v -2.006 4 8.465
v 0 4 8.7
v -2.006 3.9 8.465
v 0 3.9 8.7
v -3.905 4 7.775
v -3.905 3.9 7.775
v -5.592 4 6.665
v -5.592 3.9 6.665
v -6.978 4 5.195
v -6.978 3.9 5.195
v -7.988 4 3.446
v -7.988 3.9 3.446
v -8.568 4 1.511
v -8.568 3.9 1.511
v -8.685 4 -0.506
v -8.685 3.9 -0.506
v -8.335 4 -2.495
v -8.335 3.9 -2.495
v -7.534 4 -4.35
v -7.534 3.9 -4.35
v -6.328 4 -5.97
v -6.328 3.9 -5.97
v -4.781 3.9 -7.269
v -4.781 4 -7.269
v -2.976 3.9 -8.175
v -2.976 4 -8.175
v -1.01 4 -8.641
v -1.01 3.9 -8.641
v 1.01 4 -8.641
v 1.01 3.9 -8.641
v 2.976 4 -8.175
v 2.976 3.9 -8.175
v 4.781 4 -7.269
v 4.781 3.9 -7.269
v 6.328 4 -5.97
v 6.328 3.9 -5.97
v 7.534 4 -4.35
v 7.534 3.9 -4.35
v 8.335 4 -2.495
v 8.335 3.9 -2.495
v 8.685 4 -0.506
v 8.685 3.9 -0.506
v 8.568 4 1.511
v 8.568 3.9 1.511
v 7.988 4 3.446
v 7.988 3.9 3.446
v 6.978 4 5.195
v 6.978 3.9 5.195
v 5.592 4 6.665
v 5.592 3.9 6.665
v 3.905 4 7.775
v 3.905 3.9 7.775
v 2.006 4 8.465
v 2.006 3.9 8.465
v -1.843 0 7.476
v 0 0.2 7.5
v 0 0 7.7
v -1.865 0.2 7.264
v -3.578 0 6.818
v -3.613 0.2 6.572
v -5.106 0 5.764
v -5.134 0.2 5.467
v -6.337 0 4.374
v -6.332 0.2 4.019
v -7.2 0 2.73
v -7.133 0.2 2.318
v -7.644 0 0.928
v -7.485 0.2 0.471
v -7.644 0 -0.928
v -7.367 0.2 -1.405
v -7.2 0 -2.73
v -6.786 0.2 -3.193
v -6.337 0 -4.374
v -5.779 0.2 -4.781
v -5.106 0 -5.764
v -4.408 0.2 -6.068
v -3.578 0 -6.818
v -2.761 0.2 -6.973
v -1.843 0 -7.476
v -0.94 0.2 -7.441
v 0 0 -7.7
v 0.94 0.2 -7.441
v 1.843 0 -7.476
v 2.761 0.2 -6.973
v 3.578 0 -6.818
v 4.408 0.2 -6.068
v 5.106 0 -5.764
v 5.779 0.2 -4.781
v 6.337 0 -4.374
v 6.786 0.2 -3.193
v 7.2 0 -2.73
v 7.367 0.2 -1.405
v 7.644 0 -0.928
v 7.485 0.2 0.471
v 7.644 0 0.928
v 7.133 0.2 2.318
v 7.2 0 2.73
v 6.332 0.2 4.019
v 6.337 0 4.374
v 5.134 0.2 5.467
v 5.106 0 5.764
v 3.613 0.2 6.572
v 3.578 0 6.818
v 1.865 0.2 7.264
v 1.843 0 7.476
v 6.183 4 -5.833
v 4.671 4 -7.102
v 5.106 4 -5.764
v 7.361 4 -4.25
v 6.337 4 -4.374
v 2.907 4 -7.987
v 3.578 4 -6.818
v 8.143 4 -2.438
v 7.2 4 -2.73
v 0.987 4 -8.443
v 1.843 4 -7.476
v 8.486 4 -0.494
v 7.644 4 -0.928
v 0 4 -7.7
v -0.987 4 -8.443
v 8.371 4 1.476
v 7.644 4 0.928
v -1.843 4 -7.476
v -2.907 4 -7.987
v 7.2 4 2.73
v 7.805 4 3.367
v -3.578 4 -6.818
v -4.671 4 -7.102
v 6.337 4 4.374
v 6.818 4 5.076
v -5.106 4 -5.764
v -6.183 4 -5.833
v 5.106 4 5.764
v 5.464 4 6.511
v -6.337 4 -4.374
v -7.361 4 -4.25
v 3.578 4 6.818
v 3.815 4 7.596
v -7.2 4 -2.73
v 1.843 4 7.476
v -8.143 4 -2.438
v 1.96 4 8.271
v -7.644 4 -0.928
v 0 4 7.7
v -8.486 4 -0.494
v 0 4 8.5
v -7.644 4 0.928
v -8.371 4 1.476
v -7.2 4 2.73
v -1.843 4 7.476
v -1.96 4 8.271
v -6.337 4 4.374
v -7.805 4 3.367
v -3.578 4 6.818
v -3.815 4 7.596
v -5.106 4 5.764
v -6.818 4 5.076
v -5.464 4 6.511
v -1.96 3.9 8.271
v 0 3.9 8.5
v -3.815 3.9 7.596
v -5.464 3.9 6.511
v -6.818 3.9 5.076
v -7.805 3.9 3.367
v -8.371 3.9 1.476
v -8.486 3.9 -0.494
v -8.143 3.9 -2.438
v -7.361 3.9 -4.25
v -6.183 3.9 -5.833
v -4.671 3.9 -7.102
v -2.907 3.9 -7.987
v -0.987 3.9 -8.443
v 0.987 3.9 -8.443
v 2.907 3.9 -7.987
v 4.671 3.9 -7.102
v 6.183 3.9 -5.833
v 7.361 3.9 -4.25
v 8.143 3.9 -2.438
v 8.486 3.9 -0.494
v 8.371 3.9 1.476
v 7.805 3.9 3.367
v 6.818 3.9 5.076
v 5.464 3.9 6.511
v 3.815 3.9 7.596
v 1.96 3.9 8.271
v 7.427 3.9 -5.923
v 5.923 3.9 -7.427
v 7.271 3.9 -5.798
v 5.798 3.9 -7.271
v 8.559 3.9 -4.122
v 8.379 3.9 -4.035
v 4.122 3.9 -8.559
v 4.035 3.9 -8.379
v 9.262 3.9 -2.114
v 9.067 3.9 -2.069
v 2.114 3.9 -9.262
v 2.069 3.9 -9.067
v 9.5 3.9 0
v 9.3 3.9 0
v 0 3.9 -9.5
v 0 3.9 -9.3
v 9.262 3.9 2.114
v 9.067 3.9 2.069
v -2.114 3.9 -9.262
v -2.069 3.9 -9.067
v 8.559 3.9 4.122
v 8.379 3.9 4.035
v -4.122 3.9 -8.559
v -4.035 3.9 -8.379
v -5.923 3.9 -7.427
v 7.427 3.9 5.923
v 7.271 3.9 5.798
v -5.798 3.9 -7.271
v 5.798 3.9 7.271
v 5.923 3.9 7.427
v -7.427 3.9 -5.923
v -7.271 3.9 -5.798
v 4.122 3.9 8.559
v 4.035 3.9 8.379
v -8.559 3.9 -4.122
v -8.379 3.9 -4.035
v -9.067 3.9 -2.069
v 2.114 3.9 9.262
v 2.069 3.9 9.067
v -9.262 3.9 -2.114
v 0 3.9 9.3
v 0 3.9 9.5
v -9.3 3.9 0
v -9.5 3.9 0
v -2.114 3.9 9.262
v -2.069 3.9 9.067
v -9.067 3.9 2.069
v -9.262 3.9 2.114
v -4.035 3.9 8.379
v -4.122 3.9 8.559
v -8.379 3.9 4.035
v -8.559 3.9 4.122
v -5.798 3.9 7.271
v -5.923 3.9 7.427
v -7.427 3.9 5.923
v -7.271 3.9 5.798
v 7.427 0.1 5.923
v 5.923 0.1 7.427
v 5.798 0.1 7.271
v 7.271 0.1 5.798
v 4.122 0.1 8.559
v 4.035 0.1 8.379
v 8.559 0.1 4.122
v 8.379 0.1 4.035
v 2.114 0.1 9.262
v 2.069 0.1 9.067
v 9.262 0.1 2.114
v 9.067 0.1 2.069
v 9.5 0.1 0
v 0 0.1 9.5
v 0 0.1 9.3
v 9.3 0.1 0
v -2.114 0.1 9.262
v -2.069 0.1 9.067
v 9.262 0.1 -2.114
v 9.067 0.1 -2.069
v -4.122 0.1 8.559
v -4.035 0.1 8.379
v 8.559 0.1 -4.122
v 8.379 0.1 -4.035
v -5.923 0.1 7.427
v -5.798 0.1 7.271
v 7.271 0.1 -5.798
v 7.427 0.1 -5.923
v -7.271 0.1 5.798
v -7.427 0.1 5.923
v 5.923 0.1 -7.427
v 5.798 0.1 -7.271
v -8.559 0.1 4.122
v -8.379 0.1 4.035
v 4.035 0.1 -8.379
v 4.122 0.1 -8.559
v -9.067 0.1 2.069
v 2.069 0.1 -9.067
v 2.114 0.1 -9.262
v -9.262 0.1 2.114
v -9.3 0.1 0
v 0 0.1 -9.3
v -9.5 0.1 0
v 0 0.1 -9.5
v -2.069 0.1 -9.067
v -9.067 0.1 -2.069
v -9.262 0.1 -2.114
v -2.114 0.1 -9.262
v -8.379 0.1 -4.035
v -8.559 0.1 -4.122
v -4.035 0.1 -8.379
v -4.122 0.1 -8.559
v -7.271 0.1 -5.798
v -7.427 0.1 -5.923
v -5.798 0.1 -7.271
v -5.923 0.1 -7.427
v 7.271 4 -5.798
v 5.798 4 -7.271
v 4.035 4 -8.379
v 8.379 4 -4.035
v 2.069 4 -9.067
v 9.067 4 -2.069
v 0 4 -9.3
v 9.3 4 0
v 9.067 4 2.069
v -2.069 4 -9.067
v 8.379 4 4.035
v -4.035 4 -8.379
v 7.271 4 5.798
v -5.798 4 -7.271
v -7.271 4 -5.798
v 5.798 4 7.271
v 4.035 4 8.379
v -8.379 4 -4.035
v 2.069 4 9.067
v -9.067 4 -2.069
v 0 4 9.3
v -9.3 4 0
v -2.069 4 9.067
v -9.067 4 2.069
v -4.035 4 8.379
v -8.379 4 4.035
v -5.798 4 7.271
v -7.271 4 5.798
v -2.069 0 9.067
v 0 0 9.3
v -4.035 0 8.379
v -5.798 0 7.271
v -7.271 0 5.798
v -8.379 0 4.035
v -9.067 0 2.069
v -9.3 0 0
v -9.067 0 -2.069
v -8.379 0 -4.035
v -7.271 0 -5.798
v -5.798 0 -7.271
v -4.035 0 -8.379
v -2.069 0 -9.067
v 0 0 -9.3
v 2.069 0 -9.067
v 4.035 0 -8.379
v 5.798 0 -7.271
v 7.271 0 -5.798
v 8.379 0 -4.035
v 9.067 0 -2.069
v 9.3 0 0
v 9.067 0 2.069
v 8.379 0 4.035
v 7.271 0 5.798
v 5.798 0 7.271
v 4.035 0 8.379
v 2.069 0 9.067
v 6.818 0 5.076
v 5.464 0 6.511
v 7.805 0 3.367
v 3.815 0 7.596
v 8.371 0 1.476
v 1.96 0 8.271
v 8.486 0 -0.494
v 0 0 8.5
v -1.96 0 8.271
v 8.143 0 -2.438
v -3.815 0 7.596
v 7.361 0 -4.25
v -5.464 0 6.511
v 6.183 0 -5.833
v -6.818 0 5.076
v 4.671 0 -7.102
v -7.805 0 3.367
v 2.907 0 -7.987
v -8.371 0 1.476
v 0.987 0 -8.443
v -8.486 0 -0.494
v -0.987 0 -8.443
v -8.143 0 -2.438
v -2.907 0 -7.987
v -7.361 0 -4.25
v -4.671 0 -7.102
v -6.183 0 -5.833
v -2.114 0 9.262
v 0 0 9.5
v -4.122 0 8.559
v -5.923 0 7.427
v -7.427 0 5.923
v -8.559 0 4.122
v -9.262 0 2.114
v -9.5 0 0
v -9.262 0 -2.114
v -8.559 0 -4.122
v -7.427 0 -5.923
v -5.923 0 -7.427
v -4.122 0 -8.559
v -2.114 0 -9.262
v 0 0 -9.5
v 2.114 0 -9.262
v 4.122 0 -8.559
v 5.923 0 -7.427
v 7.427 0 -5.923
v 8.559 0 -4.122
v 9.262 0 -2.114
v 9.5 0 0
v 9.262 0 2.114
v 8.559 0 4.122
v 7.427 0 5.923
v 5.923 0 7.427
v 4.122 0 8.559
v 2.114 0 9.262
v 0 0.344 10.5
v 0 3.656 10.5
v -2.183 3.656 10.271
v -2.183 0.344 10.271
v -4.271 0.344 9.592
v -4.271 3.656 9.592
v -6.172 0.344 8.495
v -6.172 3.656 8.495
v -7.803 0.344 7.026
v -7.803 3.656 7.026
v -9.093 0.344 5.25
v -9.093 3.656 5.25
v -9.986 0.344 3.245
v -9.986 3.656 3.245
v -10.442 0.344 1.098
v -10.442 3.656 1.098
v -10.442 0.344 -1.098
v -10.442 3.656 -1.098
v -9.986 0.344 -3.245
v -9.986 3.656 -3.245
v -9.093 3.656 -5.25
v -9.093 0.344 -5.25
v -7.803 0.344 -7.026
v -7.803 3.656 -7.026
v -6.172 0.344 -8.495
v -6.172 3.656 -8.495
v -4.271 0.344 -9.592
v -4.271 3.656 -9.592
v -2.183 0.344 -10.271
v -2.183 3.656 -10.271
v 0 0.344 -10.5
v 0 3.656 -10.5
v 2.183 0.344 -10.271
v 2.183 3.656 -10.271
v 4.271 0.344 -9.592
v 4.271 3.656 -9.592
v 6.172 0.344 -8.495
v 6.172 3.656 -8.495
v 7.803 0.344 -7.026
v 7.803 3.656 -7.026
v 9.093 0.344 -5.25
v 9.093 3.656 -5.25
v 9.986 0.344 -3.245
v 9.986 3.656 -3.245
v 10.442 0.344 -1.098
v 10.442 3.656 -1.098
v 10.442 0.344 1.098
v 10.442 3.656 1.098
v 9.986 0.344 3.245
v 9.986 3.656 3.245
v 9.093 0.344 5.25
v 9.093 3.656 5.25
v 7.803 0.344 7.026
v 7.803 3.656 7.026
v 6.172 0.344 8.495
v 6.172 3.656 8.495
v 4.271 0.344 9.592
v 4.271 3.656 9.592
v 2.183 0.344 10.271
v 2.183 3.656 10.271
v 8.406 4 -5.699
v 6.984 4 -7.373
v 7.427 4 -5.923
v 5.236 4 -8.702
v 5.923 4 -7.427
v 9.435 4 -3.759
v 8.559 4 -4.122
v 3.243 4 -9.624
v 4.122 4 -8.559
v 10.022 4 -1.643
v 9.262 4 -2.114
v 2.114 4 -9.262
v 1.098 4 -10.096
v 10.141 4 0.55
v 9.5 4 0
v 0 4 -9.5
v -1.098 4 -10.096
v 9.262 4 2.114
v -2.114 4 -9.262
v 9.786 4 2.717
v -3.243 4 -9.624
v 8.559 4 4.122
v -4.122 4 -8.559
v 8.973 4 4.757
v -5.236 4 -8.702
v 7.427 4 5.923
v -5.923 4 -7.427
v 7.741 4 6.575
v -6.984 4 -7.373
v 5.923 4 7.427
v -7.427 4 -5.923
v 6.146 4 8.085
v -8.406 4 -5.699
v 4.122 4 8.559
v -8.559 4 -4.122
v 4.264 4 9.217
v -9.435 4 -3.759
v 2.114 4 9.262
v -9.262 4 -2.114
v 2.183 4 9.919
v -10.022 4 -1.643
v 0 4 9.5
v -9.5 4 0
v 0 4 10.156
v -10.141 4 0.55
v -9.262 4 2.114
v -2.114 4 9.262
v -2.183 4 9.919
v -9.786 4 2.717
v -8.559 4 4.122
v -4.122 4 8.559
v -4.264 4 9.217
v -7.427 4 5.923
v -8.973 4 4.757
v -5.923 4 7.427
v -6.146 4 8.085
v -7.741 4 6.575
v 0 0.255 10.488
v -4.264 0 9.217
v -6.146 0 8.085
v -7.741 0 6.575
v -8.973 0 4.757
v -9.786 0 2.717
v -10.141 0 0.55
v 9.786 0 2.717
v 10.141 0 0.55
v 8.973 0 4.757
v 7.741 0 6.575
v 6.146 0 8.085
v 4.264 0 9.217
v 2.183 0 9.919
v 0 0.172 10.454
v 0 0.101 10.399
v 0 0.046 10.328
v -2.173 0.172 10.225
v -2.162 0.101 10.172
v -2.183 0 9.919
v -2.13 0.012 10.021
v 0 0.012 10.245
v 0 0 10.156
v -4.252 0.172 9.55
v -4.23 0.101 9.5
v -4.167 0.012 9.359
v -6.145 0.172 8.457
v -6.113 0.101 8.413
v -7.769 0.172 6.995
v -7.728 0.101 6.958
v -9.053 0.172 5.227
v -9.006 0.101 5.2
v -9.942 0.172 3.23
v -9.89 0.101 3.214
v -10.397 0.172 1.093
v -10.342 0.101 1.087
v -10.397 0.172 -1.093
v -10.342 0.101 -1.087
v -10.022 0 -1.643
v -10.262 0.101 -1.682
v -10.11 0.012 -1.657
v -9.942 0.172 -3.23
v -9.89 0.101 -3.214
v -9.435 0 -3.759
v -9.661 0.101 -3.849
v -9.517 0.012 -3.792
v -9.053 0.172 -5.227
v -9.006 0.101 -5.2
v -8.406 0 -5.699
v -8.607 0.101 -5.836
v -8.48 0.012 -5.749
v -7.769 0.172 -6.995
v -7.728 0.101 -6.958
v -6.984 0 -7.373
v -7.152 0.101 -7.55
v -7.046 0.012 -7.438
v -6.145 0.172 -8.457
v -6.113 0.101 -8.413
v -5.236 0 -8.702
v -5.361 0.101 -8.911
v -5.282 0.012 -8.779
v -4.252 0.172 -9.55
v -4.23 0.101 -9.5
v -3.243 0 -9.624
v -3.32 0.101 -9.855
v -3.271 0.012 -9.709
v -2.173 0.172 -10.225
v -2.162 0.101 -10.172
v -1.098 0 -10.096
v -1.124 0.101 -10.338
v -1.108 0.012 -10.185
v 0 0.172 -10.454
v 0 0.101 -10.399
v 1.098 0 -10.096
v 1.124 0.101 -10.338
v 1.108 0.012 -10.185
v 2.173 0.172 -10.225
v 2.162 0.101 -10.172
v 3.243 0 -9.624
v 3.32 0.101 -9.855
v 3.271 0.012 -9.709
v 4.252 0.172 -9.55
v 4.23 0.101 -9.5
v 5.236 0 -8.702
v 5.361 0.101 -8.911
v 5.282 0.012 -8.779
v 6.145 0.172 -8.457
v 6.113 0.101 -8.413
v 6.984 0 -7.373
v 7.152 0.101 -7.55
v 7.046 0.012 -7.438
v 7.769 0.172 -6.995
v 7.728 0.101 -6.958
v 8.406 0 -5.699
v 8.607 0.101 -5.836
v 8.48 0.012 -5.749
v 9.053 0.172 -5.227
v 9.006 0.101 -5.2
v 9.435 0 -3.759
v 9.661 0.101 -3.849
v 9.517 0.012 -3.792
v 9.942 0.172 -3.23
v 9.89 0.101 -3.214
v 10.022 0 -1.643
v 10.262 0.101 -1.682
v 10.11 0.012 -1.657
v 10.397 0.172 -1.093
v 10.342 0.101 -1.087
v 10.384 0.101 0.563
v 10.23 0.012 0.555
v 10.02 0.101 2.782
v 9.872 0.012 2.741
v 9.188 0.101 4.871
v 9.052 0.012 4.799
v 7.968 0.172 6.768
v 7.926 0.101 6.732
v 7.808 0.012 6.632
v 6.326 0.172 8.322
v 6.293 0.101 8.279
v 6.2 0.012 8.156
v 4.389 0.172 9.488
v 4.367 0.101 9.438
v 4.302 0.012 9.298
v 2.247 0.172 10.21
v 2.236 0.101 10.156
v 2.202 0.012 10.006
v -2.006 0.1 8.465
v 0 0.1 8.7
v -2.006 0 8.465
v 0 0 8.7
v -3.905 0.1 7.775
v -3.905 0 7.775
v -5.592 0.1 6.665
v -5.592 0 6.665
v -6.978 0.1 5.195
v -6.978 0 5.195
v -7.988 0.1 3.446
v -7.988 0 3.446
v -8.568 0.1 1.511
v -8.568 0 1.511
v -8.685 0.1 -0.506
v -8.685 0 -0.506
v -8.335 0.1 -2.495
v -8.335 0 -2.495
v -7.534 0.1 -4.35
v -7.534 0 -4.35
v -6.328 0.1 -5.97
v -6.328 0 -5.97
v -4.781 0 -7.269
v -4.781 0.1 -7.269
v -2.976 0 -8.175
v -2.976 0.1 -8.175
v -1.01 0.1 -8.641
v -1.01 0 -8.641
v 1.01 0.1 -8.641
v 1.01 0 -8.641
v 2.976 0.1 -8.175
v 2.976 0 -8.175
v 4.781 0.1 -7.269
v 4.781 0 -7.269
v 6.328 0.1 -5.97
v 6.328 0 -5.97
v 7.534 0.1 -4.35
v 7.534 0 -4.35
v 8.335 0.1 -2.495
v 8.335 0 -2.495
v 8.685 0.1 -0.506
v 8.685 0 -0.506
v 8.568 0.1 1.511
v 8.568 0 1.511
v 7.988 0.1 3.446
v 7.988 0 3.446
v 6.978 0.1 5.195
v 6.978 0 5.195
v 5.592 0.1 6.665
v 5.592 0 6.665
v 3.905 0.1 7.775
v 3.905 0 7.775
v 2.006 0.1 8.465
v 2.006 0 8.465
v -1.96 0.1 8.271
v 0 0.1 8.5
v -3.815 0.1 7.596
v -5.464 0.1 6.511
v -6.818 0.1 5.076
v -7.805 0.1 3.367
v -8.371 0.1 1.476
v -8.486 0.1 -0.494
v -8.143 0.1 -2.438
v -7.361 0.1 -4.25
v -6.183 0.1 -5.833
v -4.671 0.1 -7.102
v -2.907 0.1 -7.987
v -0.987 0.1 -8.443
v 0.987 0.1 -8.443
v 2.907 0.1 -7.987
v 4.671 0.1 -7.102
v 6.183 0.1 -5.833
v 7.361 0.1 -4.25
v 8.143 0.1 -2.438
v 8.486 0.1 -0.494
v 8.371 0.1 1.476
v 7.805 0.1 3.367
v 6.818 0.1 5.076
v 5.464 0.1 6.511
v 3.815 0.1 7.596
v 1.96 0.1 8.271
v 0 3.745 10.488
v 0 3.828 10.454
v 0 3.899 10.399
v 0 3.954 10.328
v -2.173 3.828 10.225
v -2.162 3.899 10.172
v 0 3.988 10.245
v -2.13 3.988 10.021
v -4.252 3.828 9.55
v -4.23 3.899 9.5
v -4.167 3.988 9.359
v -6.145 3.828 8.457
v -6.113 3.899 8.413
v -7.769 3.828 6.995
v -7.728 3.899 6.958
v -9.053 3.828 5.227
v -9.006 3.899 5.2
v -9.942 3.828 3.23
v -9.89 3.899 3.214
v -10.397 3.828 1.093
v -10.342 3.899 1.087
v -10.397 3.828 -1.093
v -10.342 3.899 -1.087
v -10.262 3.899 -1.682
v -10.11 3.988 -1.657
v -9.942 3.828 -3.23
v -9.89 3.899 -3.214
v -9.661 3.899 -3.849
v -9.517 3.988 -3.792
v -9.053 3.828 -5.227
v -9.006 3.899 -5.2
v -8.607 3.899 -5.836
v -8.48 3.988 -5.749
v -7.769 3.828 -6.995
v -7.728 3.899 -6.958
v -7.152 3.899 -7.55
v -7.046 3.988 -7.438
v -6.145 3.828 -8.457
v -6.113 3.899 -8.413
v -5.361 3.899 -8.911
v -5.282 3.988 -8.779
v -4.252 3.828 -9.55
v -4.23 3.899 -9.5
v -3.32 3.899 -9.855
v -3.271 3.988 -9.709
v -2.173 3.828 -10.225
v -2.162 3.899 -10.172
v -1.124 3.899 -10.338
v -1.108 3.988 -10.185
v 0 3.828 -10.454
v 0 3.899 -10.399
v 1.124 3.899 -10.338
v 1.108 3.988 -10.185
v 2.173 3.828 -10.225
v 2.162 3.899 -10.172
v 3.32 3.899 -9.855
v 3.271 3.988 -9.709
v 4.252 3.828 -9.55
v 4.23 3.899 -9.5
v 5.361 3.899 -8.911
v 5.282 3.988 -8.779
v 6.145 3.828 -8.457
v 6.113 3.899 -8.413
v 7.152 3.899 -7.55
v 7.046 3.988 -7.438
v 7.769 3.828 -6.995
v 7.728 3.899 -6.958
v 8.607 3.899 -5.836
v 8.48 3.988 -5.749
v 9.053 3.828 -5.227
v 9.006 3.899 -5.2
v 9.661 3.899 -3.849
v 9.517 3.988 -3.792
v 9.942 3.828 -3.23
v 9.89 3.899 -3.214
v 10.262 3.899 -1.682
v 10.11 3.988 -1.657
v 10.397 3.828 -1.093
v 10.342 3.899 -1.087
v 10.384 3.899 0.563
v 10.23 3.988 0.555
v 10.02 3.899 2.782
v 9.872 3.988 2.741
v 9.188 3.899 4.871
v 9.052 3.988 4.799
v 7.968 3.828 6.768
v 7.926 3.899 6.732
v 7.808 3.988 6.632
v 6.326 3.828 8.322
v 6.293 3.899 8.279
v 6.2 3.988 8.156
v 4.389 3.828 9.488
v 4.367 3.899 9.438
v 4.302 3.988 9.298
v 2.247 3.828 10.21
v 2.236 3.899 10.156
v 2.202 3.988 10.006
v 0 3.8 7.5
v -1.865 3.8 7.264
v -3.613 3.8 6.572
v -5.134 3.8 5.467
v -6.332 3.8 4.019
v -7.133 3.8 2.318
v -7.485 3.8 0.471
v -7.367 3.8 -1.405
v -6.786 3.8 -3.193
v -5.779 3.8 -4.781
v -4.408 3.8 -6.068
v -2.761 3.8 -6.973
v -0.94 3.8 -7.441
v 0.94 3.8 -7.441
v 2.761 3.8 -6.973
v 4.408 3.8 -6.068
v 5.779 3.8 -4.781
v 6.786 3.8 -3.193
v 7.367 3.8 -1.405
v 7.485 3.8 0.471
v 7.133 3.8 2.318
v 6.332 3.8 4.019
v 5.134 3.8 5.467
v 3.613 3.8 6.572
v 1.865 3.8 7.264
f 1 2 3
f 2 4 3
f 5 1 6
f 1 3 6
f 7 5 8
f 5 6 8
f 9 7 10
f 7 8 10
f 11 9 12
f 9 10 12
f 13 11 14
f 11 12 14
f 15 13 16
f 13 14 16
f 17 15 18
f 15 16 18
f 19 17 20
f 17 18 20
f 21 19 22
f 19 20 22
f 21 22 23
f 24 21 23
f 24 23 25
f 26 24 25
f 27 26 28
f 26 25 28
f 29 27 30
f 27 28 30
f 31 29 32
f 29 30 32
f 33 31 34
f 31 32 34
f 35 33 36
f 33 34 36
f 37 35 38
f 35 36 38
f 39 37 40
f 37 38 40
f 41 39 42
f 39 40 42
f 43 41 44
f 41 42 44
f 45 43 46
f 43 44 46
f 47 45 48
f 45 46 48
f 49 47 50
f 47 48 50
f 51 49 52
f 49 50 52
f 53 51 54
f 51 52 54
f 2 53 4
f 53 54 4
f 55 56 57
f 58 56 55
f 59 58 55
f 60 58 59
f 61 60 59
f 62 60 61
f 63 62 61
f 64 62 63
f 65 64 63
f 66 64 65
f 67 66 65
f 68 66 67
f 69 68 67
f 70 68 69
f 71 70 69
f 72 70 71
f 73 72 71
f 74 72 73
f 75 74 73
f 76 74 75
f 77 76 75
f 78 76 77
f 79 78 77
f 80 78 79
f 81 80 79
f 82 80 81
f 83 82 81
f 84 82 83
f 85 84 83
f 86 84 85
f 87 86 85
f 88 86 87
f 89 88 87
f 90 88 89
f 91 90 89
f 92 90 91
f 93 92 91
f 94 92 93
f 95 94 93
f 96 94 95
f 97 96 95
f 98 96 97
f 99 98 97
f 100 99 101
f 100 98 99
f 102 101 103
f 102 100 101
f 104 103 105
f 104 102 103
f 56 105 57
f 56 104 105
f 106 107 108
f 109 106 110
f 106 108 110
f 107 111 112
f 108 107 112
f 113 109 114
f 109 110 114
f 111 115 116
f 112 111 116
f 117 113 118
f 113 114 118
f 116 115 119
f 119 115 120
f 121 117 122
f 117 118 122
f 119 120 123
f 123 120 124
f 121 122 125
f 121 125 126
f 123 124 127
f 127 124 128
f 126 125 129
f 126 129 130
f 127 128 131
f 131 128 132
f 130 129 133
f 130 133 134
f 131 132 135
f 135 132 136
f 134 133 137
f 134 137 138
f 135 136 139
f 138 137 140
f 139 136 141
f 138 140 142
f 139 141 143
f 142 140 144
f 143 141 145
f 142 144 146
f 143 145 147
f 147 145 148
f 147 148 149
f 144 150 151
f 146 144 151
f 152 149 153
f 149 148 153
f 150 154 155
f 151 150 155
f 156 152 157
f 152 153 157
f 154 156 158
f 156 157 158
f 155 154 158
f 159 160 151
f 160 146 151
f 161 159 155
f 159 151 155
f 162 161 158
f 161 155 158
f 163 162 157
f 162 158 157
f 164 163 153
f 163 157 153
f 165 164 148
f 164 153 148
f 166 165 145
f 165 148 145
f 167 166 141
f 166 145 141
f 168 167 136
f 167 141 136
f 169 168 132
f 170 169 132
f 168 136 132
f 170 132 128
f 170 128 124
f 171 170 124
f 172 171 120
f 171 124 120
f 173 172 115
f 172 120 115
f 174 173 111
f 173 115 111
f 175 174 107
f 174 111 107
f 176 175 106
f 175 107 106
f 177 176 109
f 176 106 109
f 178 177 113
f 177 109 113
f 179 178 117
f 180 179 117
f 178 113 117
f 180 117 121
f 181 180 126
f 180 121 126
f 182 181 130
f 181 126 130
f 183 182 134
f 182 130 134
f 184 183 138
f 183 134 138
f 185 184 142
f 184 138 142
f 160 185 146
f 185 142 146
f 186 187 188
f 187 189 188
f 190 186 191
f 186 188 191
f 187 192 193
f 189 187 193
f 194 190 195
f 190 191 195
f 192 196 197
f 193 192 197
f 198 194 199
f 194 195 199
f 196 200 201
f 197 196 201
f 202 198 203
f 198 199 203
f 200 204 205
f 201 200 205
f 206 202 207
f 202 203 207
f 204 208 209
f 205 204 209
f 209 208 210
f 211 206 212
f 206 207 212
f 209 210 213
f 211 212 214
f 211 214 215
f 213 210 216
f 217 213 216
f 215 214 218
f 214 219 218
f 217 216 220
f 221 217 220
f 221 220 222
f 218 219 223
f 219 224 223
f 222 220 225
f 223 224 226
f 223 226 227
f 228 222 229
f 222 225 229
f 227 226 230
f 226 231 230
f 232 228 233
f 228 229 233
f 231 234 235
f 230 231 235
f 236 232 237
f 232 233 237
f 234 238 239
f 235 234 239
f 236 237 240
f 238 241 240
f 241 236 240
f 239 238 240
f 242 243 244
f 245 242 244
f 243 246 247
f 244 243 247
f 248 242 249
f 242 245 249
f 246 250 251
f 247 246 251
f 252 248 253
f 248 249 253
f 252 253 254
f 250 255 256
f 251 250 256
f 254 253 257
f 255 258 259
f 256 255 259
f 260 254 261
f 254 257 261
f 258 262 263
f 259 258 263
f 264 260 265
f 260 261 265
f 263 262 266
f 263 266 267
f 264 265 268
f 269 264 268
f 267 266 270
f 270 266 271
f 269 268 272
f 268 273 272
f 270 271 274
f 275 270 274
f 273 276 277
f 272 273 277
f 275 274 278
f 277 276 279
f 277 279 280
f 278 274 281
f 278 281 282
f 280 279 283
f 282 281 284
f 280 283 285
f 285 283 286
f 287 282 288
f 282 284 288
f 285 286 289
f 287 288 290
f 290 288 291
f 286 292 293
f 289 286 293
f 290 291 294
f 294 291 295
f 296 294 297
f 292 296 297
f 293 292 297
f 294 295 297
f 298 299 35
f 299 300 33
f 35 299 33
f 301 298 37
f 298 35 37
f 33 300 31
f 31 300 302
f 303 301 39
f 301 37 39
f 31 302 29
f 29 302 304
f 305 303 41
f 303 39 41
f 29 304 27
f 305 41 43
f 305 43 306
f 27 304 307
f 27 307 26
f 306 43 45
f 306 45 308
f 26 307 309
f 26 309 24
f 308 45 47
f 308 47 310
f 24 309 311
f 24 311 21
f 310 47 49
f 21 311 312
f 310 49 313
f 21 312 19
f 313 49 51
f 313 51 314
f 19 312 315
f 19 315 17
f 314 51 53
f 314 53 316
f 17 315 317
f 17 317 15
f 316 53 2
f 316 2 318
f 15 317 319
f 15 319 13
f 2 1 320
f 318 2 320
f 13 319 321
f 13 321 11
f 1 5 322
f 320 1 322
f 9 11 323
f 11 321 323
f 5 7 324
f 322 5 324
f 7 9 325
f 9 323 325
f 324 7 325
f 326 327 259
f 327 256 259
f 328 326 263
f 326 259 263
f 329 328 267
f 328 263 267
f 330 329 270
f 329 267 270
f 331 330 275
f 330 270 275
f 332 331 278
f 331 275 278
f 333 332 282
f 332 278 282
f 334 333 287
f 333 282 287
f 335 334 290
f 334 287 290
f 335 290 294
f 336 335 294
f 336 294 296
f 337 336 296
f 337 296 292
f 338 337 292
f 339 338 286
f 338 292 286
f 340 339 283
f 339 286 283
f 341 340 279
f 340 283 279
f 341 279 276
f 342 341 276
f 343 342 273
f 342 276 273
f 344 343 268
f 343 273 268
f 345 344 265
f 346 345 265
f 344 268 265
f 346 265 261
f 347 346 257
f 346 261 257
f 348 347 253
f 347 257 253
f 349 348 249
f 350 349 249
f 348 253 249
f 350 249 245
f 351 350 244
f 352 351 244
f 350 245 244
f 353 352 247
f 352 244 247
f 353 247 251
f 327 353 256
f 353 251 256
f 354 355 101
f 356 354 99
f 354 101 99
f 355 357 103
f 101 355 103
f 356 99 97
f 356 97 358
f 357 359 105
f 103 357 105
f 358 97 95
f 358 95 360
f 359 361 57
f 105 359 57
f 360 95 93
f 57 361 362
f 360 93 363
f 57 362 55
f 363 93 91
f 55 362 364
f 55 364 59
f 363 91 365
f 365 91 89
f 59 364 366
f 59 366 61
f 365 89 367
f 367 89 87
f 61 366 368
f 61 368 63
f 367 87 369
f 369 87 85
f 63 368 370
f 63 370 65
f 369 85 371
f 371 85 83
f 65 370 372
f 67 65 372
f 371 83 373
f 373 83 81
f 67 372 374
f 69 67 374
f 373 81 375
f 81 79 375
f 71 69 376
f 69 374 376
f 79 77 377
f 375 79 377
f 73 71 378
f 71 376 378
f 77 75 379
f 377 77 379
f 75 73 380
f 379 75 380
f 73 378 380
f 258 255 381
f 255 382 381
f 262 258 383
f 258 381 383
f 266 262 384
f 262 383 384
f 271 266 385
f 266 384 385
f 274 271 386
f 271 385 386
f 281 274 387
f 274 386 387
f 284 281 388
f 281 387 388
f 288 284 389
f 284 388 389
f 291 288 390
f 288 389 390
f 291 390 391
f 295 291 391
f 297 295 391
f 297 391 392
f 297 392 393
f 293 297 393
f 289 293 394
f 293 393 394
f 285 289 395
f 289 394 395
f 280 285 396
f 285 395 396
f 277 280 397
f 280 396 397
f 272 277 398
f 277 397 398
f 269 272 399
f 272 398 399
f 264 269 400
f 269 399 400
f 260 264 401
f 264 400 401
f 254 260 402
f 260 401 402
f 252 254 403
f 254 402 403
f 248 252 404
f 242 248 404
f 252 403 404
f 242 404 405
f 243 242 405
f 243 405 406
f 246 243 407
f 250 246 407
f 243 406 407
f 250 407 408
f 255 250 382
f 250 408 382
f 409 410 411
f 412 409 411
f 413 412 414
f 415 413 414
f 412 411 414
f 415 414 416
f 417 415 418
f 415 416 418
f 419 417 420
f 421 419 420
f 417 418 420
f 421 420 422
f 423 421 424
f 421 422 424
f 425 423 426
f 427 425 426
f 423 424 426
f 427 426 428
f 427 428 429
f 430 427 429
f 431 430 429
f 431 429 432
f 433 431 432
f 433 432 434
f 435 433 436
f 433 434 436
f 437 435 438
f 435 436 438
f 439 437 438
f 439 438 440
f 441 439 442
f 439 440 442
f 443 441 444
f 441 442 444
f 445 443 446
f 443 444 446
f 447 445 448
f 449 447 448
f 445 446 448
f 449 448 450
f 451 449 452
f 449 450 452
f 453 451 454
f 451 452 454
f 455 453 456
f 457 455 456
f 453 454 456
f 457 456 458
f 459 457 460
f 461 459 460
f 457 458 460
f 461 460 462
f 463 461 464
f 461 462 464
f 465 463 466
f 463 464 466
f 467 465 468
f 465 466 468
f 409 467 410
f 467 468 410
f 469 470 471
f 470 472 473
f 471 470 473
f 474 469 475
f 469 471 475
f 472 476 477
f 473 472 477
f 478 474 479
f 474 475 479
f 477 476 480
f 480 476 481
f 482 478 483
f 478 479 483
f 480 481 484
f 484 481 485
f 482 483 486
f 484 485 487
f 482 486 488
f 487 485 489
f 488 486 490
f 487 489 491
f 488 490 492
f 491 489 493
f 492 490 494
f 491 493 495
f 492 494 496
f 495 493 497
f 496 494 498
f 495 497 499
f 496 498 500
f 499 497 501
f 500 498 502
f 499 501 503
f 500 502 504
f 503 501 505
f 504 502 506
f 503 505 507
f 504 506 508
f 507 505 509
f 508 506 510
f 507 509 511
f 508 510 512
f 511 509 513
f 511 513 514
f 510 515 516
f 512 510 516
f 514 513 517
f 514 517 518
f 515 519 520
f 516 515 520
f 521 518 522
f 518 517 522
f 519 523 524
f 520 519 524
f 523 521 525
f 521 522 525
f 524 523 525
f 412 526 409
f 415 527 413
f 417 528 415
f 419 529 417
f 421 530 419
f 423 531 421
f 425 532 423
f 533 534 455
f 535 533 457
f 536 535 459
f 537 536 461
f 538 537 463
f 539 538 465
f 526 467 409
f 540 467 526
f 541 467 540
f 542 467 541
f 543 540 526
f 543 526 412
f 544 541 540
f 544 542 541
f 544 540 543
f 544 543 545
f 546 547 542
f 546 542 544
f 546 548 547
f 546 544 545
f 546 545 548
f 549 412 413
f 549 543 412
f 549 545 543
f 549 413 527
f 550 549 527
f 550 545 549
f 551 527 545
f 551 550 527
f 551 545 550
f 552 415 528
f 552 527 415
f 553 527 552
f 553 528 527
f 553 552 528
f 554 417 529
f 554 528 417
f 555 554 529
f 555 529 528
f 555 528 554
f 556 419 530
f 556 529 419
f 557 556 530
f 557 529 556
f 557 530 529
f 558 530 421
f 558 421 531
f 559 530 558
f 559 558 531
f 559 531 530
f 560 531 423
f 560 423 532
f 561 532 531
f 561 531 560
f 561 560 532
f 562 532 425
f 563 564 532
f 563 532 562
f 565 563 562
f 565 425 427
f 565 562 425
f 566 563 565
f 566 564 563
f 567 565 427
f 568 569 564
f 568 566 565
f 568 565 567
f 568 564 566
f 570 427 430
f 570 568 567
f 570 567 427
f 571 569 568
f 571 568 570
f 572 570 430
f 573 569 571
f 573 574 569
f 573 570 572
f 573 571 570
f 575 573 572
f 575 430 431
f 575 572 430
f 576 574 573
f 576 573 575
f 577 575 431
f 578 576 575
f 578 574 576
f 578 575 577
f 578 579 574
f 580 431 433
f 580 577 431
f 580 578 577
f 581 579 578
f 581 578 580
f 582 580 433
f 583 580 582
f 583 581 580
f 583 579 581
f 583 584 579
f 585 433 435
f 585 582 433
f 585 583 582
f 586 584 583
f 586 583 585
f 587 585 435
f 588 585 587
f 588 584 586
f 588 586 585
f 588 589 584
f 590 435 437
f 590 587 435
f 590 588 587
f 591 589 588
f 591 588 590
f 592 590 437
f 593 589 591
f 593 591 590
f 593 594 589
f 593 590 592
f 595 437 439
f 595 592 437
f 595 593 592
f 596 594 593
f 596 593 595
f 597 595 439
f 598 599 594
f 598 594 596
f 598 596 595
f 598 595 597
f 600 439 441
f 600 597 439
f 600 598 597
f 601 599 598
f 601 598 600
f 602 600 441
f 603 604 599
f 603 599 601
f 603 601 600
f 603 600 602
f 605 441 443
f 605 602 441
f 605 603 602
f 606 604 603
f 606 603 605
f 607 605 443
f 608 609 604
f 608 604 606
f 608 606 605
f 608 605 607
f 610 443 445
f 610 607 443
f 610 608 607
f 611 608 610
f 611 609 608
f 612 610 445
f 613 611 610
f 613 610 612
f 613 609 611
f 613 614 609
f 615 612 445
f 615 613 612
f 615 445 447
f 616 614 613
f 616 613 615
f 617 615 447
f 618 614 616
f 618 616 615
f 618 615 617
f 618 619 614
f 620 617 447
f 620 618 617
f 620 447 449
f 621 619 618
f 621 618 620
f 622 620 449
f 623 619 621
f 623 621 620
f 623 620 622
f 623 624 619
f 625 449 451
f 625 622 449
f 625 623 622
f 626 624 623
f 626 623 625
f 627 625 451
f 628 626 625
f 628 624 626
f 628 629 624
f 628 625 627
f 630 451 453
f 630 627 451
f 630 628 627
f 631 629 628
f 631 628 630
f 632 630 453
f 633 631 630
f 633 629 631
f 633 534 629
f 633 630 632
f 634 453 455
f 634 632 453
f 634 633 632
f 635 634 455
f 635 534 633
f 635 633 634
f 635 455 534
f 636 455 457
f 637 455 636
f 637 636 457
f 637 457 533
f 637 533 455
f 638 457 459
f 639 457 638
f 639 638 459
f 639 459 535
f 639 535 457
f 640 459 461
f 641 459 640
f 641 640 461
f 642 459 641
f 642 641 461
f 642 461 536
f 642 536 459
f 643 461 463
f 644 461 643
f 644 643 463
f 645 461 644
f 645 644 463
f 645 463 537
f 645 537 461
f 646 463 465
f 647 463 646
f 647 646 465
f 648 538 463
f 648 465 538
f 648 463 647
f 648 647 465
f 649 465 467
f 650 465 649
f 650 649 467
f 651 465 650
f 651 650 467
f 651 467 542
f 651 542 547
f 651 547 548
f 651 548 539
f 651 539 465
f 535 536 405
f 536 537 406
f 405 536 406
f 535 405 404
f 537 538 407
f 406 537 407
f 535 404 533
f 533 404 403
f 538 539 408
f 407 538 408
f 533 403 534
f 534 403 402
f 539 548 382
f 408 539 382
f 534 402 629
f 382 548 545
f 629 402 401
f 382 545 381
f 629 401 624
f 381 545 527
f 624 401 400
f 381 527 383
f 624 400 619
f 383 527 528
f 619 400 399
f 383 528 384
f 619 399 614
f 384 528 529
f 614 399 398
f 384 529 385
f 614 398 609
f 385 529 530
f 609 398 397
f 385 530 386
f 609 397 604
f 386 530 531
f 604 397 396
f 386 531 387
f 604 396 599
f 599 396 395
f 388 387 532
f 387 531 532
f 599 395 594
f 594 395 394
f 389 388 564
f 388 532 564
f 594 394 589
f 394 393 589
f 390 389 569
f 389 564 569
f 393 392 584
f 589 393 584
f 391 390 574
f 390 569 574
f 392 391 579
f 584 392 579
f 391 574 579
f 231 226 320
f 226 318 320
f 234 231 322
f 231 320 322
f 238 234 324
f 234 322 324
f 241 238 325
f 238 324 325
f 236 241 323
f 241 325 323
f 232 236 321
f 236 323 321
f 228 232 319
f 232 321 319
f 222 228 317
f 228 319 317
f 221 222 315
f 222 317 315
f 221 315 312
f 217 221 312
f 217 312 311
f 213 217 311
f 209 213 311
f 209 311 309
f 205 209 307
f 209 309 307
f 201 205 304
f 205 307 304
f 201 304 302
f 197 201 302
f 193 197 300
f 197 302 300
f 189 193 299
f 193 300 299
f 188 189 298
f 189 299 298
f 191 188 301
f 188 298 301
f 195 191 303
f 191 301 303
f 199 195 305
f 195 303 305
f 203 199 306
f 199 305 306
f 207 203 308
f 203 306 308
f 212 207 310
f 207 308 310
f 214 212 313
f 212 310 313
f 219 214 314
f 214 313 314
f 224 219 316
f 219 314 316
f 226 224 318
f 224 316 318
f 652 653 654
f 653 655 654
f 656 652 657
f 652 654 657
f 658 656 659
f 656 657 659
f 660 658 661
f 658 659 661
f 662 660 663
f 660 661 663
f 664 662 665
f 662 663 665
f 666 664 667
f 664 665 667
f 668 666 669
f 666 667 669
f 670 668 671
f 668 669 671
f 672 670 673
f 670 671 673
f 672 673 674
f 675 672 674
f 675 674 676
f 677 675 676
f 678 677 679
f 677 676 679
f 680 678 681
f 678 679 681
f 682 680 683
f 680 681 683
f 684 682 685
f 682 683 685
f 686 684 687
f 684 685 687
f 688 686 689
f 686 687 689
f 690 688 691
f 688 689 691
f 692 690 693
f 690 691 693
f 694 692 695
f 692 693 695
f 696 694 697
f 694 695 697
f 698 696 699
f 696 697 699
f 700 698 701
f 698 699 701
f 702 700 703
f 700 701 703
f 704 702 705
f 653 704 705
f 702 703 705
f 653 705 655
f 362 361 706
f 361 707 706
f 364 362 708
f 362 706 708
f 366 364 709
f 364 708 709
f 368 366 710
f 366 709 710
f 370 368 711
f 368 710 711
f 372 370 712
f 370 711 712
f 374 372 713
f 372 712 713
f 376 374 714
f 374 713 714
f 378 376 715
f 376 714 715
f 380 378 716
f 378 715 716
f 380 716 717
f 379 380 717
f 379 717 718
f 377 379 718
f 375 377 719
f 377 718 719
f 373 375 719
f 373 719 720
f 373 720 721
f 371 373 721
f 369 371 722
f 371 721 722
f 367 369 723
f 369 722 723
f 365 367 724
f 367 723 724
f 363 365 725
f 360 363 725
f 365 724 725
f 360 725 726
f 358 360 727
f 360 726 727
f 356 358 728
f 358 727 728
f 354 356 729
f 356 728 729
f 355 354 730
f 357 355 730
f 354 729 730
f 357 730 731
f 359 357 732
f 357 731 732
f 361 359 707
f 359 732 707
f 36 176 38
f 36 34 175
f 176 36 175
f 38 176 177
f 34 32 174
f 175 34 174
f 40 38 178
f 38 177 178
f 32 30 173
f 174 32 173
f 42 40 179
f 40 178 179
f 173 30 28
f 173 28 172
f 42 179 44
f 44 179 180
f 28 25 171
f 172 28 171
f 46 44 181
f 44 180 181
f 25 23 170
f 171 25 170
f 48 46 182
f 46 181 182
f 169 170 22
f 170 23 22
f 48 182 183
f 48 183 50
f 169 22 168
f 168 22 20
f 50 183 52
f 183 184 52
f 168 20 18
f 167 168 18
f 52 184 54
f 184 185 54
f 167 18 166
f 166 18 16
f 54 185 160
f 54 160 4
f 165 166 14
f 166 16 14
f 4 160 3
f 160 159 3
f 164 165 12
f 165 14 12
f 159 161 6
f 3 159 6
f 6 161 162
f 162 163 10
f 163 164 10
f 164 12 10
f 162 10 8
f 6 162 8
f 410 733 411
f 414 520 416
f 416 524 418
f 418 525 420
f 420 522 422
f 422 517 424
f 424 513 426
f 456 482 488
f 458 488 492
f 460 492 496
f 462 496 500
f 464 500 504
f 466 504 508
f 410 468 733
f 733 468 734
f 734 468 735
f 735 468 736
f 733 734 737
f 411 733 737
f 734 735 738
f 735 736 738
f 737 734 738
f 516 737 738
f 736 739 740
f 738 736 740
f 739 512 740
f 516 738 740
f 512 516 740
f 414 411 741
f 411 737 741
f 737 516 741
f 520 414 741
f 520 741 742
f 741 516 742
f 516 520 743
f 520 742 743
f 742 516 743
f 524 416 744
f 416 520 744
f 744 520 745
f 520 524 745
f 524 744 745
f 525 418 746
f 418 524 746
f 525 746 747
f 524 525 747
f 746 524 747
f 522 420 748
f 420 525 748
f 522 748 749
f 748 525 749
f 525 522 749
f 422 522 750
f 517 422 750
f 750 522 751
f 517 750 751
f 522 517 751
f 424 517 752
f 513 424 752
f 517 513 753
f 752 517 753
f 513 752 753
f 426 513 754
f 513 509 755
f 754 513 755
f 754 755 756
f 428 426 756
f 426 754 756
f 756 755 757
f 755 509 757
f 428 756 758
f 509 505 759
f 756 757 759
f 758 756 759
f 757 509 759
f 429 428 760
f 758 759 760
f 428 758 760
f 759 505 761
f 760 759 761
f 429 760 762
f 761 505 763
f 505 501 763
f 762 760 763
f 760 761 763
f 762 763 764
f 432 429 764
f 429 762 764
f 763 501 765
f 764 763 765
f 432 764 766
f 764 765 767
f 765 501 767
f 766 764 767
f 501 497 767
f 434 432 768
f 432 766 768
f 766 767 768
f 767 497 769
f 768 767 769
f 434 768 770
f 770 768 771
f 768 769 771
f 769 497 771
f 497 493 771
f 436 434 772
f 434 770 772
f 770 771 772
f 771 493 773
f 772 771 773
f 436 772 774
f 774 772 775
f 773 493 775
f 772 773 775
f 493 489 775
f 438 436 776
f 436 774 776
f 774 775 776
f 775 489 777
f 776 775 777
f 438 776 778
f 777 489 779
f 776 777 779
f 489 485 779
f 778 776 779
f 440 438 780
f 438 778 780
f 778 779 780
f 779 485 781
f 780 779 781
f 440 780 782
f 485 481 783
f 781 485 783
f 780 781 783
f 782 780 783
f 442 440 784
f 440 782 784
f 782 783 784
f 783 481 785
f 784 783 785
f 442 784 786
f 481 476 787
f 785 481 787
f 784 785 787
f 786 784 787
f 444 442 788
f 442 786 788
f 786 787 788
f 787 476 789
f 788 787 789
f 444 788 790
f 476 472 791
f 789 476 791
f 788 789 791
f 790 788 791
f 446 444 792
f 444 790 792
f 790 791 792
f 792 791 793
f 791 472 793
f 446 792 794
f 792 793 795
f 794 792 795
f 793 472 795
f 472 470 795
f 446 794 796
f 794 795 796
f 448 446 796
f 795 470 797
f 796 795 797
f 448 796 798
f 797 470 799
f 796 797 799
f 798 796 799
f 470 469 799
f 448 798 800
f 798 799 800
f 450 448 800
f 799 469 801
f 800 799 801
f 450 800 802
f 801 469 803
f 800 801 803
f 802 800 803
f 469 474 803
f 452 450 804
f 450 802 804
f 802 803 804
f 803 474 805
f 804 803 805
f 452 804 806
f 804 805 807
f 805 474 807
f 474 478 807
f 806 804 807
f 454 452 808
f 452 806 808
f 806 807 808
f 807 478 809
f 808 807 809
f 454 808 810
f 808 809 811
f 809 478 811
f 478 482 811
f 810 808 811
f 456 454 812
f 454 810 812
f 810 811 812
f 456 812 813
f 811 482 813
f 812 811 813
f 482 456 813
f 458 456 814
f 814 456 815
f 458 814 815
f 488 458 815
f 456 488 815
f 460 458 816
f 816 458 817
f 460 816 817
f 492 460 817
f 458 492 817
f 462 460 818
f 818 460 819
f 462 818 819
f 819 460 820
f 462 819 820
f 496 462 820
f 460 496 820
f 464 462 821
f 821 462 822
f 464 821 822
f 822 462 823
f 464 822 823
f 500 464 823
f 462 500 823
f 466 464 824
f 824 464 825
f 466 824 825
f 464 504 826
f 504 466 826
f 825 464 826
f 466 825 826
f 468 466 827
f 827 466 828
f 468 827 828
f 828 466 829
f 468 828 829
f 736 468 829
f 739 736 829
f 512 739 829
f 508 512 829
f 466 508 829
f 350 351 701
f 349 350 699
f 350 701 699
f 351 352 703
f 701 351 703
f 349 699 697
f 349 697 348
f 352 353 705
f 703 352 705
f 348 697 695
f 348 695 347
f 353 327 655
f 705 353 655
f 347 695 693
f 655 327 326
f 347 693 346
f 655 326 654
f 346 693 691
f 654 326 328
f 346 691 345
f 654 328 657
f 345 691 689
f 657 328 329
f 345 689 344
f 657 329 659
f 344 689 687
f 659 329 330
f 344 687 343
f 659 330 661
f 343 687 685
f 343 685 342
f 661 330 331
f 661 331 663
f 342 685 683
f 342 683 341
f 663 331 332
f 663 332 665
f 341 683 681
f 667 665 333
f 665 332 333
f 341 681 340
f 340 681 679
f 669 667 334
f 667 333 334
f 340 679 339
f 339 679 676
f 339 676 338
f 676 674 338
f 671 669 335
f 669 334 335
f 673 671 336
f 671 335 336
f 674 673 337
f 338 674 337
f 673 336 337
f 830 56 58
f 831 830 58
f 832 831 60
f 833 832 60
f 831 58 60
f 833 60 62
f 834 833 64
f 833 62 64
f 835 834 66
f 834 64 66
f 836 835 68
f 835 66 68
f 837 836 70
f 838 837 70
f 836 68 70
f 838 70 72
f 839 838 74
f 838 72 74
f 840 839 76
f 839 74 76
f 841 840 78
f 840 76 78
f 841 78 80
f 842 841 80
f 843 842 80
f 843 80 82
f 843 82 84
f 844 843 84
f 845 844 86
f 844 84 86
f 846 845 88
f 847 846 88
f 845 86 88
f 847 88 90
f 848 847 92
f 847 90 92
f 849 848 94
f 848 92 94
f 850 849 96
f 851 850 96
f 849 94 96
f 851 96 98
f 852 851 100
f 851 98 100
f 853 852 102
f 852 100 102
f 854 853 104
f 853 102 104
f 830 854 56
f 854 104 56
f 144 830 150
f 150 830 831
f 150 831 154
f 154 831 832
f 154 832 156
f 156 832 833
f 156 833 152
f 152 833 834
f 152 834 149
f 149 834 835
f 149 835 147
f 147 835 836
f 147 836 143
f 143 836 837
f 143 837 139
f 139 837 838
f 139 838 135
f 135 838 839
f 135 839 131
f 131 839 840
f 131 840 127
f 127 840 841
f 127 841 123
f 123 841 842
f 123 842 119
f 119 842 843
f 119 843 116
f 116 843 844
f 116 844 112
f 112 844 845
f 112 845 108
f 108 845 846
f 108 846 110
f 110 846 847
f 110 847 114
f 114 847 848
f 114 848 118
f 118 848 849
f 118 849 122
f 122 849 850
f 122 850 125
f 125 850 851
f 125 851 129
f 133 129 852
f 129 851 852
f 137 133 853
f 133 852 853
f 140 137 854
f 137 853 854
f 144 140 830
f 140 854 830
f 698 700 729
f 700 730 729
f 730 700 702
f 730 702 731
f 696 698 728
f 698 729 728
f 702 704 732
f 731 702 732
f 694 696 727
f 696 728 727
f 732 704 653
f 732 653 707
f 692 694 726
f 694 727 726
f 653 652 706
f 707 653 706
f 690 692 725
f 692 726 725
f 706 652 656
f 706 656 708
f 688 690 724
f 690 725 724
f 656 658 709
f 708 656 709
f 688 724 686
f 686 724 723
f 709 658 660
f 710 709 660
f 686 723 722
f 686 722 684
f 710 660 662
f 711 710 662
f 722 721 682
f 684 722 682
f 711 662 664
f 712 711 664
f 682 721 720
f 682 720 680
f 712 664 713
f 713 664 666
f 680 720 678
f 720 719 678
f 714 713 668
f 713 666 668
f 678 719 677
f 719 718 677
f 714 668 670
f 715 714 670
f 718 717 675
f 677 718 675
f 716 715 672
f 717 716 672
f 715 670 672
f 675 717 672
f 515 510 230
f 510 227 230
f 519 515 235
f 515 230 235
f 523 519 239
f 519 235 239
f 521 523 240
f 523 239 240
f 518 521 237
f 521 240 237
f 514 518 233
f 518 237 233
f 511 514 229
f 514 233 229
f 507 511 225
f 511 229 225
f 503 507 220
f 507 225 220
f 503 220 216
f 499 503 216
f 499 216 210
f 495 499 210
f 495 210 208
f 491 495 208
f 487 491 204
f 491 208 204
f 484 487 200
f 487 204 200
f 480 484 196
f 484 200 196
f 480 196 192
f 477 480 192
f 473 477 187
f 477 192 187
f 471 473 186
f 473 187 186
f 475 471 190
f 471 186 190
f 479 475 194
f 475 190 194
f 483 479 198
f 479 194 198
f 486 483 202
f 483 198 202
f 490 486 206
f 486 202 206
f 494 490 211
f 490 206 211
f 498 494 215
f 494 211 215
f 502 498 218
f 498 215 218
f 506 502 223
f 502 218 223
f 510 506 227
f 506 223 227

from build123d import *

# Parameters (mm, degrees)
FILLET2_R     = 0.344
CHAMFER2_SIZE = 0.2


with BuildPart() as part:
    # Sketch1 → Revolve1 (revolve)
    with BuildSketch(Plane.XY, mode=Mode.PRIVATE) as revolve1_sk:
        Polygon((10.5, 0), (10.5, 4), (9.5, 4), (9.5, 3.9), (9.3, 3.9), (9.3, 4), (8.7, 4), (8.7, 3.9), (8.5, 3.9), (8.5, 4), (7.5, 4), (7.5, 0), (8.5, 0), (8.5, 0.1), (8.7, 0.1), (8.7, 0), (9.3, 0), (9.3, 0.1), (9.5, 0.1), (9.5, 0), align=None)
    revolve(revolve1_sk.sketch.rotate(Axis((0, 2, 0), (0, -1, 0)), 90), axis=Axis((0, 2, 0), (0, -1, 0)))

    # Fillet2
    fillet2_edges = [part.edges().sort_by_distance(p)[0] for p in [
        (0, 0, -10.5),
        (0, 4, -10.5),
    ]]
    fillet(fillet2_edges, radius=FILLET2_R)

    # Chamfer2
    chamfer2_edges = [part.edges().sort_by_distance(p)[0] for p in [
        (0, 4, -7.5),
        (0, 0, -7.5),
    ]]
    chamfer(chamfer2_edges, length=CHAMFER2_SIZE)


solid = part.part
